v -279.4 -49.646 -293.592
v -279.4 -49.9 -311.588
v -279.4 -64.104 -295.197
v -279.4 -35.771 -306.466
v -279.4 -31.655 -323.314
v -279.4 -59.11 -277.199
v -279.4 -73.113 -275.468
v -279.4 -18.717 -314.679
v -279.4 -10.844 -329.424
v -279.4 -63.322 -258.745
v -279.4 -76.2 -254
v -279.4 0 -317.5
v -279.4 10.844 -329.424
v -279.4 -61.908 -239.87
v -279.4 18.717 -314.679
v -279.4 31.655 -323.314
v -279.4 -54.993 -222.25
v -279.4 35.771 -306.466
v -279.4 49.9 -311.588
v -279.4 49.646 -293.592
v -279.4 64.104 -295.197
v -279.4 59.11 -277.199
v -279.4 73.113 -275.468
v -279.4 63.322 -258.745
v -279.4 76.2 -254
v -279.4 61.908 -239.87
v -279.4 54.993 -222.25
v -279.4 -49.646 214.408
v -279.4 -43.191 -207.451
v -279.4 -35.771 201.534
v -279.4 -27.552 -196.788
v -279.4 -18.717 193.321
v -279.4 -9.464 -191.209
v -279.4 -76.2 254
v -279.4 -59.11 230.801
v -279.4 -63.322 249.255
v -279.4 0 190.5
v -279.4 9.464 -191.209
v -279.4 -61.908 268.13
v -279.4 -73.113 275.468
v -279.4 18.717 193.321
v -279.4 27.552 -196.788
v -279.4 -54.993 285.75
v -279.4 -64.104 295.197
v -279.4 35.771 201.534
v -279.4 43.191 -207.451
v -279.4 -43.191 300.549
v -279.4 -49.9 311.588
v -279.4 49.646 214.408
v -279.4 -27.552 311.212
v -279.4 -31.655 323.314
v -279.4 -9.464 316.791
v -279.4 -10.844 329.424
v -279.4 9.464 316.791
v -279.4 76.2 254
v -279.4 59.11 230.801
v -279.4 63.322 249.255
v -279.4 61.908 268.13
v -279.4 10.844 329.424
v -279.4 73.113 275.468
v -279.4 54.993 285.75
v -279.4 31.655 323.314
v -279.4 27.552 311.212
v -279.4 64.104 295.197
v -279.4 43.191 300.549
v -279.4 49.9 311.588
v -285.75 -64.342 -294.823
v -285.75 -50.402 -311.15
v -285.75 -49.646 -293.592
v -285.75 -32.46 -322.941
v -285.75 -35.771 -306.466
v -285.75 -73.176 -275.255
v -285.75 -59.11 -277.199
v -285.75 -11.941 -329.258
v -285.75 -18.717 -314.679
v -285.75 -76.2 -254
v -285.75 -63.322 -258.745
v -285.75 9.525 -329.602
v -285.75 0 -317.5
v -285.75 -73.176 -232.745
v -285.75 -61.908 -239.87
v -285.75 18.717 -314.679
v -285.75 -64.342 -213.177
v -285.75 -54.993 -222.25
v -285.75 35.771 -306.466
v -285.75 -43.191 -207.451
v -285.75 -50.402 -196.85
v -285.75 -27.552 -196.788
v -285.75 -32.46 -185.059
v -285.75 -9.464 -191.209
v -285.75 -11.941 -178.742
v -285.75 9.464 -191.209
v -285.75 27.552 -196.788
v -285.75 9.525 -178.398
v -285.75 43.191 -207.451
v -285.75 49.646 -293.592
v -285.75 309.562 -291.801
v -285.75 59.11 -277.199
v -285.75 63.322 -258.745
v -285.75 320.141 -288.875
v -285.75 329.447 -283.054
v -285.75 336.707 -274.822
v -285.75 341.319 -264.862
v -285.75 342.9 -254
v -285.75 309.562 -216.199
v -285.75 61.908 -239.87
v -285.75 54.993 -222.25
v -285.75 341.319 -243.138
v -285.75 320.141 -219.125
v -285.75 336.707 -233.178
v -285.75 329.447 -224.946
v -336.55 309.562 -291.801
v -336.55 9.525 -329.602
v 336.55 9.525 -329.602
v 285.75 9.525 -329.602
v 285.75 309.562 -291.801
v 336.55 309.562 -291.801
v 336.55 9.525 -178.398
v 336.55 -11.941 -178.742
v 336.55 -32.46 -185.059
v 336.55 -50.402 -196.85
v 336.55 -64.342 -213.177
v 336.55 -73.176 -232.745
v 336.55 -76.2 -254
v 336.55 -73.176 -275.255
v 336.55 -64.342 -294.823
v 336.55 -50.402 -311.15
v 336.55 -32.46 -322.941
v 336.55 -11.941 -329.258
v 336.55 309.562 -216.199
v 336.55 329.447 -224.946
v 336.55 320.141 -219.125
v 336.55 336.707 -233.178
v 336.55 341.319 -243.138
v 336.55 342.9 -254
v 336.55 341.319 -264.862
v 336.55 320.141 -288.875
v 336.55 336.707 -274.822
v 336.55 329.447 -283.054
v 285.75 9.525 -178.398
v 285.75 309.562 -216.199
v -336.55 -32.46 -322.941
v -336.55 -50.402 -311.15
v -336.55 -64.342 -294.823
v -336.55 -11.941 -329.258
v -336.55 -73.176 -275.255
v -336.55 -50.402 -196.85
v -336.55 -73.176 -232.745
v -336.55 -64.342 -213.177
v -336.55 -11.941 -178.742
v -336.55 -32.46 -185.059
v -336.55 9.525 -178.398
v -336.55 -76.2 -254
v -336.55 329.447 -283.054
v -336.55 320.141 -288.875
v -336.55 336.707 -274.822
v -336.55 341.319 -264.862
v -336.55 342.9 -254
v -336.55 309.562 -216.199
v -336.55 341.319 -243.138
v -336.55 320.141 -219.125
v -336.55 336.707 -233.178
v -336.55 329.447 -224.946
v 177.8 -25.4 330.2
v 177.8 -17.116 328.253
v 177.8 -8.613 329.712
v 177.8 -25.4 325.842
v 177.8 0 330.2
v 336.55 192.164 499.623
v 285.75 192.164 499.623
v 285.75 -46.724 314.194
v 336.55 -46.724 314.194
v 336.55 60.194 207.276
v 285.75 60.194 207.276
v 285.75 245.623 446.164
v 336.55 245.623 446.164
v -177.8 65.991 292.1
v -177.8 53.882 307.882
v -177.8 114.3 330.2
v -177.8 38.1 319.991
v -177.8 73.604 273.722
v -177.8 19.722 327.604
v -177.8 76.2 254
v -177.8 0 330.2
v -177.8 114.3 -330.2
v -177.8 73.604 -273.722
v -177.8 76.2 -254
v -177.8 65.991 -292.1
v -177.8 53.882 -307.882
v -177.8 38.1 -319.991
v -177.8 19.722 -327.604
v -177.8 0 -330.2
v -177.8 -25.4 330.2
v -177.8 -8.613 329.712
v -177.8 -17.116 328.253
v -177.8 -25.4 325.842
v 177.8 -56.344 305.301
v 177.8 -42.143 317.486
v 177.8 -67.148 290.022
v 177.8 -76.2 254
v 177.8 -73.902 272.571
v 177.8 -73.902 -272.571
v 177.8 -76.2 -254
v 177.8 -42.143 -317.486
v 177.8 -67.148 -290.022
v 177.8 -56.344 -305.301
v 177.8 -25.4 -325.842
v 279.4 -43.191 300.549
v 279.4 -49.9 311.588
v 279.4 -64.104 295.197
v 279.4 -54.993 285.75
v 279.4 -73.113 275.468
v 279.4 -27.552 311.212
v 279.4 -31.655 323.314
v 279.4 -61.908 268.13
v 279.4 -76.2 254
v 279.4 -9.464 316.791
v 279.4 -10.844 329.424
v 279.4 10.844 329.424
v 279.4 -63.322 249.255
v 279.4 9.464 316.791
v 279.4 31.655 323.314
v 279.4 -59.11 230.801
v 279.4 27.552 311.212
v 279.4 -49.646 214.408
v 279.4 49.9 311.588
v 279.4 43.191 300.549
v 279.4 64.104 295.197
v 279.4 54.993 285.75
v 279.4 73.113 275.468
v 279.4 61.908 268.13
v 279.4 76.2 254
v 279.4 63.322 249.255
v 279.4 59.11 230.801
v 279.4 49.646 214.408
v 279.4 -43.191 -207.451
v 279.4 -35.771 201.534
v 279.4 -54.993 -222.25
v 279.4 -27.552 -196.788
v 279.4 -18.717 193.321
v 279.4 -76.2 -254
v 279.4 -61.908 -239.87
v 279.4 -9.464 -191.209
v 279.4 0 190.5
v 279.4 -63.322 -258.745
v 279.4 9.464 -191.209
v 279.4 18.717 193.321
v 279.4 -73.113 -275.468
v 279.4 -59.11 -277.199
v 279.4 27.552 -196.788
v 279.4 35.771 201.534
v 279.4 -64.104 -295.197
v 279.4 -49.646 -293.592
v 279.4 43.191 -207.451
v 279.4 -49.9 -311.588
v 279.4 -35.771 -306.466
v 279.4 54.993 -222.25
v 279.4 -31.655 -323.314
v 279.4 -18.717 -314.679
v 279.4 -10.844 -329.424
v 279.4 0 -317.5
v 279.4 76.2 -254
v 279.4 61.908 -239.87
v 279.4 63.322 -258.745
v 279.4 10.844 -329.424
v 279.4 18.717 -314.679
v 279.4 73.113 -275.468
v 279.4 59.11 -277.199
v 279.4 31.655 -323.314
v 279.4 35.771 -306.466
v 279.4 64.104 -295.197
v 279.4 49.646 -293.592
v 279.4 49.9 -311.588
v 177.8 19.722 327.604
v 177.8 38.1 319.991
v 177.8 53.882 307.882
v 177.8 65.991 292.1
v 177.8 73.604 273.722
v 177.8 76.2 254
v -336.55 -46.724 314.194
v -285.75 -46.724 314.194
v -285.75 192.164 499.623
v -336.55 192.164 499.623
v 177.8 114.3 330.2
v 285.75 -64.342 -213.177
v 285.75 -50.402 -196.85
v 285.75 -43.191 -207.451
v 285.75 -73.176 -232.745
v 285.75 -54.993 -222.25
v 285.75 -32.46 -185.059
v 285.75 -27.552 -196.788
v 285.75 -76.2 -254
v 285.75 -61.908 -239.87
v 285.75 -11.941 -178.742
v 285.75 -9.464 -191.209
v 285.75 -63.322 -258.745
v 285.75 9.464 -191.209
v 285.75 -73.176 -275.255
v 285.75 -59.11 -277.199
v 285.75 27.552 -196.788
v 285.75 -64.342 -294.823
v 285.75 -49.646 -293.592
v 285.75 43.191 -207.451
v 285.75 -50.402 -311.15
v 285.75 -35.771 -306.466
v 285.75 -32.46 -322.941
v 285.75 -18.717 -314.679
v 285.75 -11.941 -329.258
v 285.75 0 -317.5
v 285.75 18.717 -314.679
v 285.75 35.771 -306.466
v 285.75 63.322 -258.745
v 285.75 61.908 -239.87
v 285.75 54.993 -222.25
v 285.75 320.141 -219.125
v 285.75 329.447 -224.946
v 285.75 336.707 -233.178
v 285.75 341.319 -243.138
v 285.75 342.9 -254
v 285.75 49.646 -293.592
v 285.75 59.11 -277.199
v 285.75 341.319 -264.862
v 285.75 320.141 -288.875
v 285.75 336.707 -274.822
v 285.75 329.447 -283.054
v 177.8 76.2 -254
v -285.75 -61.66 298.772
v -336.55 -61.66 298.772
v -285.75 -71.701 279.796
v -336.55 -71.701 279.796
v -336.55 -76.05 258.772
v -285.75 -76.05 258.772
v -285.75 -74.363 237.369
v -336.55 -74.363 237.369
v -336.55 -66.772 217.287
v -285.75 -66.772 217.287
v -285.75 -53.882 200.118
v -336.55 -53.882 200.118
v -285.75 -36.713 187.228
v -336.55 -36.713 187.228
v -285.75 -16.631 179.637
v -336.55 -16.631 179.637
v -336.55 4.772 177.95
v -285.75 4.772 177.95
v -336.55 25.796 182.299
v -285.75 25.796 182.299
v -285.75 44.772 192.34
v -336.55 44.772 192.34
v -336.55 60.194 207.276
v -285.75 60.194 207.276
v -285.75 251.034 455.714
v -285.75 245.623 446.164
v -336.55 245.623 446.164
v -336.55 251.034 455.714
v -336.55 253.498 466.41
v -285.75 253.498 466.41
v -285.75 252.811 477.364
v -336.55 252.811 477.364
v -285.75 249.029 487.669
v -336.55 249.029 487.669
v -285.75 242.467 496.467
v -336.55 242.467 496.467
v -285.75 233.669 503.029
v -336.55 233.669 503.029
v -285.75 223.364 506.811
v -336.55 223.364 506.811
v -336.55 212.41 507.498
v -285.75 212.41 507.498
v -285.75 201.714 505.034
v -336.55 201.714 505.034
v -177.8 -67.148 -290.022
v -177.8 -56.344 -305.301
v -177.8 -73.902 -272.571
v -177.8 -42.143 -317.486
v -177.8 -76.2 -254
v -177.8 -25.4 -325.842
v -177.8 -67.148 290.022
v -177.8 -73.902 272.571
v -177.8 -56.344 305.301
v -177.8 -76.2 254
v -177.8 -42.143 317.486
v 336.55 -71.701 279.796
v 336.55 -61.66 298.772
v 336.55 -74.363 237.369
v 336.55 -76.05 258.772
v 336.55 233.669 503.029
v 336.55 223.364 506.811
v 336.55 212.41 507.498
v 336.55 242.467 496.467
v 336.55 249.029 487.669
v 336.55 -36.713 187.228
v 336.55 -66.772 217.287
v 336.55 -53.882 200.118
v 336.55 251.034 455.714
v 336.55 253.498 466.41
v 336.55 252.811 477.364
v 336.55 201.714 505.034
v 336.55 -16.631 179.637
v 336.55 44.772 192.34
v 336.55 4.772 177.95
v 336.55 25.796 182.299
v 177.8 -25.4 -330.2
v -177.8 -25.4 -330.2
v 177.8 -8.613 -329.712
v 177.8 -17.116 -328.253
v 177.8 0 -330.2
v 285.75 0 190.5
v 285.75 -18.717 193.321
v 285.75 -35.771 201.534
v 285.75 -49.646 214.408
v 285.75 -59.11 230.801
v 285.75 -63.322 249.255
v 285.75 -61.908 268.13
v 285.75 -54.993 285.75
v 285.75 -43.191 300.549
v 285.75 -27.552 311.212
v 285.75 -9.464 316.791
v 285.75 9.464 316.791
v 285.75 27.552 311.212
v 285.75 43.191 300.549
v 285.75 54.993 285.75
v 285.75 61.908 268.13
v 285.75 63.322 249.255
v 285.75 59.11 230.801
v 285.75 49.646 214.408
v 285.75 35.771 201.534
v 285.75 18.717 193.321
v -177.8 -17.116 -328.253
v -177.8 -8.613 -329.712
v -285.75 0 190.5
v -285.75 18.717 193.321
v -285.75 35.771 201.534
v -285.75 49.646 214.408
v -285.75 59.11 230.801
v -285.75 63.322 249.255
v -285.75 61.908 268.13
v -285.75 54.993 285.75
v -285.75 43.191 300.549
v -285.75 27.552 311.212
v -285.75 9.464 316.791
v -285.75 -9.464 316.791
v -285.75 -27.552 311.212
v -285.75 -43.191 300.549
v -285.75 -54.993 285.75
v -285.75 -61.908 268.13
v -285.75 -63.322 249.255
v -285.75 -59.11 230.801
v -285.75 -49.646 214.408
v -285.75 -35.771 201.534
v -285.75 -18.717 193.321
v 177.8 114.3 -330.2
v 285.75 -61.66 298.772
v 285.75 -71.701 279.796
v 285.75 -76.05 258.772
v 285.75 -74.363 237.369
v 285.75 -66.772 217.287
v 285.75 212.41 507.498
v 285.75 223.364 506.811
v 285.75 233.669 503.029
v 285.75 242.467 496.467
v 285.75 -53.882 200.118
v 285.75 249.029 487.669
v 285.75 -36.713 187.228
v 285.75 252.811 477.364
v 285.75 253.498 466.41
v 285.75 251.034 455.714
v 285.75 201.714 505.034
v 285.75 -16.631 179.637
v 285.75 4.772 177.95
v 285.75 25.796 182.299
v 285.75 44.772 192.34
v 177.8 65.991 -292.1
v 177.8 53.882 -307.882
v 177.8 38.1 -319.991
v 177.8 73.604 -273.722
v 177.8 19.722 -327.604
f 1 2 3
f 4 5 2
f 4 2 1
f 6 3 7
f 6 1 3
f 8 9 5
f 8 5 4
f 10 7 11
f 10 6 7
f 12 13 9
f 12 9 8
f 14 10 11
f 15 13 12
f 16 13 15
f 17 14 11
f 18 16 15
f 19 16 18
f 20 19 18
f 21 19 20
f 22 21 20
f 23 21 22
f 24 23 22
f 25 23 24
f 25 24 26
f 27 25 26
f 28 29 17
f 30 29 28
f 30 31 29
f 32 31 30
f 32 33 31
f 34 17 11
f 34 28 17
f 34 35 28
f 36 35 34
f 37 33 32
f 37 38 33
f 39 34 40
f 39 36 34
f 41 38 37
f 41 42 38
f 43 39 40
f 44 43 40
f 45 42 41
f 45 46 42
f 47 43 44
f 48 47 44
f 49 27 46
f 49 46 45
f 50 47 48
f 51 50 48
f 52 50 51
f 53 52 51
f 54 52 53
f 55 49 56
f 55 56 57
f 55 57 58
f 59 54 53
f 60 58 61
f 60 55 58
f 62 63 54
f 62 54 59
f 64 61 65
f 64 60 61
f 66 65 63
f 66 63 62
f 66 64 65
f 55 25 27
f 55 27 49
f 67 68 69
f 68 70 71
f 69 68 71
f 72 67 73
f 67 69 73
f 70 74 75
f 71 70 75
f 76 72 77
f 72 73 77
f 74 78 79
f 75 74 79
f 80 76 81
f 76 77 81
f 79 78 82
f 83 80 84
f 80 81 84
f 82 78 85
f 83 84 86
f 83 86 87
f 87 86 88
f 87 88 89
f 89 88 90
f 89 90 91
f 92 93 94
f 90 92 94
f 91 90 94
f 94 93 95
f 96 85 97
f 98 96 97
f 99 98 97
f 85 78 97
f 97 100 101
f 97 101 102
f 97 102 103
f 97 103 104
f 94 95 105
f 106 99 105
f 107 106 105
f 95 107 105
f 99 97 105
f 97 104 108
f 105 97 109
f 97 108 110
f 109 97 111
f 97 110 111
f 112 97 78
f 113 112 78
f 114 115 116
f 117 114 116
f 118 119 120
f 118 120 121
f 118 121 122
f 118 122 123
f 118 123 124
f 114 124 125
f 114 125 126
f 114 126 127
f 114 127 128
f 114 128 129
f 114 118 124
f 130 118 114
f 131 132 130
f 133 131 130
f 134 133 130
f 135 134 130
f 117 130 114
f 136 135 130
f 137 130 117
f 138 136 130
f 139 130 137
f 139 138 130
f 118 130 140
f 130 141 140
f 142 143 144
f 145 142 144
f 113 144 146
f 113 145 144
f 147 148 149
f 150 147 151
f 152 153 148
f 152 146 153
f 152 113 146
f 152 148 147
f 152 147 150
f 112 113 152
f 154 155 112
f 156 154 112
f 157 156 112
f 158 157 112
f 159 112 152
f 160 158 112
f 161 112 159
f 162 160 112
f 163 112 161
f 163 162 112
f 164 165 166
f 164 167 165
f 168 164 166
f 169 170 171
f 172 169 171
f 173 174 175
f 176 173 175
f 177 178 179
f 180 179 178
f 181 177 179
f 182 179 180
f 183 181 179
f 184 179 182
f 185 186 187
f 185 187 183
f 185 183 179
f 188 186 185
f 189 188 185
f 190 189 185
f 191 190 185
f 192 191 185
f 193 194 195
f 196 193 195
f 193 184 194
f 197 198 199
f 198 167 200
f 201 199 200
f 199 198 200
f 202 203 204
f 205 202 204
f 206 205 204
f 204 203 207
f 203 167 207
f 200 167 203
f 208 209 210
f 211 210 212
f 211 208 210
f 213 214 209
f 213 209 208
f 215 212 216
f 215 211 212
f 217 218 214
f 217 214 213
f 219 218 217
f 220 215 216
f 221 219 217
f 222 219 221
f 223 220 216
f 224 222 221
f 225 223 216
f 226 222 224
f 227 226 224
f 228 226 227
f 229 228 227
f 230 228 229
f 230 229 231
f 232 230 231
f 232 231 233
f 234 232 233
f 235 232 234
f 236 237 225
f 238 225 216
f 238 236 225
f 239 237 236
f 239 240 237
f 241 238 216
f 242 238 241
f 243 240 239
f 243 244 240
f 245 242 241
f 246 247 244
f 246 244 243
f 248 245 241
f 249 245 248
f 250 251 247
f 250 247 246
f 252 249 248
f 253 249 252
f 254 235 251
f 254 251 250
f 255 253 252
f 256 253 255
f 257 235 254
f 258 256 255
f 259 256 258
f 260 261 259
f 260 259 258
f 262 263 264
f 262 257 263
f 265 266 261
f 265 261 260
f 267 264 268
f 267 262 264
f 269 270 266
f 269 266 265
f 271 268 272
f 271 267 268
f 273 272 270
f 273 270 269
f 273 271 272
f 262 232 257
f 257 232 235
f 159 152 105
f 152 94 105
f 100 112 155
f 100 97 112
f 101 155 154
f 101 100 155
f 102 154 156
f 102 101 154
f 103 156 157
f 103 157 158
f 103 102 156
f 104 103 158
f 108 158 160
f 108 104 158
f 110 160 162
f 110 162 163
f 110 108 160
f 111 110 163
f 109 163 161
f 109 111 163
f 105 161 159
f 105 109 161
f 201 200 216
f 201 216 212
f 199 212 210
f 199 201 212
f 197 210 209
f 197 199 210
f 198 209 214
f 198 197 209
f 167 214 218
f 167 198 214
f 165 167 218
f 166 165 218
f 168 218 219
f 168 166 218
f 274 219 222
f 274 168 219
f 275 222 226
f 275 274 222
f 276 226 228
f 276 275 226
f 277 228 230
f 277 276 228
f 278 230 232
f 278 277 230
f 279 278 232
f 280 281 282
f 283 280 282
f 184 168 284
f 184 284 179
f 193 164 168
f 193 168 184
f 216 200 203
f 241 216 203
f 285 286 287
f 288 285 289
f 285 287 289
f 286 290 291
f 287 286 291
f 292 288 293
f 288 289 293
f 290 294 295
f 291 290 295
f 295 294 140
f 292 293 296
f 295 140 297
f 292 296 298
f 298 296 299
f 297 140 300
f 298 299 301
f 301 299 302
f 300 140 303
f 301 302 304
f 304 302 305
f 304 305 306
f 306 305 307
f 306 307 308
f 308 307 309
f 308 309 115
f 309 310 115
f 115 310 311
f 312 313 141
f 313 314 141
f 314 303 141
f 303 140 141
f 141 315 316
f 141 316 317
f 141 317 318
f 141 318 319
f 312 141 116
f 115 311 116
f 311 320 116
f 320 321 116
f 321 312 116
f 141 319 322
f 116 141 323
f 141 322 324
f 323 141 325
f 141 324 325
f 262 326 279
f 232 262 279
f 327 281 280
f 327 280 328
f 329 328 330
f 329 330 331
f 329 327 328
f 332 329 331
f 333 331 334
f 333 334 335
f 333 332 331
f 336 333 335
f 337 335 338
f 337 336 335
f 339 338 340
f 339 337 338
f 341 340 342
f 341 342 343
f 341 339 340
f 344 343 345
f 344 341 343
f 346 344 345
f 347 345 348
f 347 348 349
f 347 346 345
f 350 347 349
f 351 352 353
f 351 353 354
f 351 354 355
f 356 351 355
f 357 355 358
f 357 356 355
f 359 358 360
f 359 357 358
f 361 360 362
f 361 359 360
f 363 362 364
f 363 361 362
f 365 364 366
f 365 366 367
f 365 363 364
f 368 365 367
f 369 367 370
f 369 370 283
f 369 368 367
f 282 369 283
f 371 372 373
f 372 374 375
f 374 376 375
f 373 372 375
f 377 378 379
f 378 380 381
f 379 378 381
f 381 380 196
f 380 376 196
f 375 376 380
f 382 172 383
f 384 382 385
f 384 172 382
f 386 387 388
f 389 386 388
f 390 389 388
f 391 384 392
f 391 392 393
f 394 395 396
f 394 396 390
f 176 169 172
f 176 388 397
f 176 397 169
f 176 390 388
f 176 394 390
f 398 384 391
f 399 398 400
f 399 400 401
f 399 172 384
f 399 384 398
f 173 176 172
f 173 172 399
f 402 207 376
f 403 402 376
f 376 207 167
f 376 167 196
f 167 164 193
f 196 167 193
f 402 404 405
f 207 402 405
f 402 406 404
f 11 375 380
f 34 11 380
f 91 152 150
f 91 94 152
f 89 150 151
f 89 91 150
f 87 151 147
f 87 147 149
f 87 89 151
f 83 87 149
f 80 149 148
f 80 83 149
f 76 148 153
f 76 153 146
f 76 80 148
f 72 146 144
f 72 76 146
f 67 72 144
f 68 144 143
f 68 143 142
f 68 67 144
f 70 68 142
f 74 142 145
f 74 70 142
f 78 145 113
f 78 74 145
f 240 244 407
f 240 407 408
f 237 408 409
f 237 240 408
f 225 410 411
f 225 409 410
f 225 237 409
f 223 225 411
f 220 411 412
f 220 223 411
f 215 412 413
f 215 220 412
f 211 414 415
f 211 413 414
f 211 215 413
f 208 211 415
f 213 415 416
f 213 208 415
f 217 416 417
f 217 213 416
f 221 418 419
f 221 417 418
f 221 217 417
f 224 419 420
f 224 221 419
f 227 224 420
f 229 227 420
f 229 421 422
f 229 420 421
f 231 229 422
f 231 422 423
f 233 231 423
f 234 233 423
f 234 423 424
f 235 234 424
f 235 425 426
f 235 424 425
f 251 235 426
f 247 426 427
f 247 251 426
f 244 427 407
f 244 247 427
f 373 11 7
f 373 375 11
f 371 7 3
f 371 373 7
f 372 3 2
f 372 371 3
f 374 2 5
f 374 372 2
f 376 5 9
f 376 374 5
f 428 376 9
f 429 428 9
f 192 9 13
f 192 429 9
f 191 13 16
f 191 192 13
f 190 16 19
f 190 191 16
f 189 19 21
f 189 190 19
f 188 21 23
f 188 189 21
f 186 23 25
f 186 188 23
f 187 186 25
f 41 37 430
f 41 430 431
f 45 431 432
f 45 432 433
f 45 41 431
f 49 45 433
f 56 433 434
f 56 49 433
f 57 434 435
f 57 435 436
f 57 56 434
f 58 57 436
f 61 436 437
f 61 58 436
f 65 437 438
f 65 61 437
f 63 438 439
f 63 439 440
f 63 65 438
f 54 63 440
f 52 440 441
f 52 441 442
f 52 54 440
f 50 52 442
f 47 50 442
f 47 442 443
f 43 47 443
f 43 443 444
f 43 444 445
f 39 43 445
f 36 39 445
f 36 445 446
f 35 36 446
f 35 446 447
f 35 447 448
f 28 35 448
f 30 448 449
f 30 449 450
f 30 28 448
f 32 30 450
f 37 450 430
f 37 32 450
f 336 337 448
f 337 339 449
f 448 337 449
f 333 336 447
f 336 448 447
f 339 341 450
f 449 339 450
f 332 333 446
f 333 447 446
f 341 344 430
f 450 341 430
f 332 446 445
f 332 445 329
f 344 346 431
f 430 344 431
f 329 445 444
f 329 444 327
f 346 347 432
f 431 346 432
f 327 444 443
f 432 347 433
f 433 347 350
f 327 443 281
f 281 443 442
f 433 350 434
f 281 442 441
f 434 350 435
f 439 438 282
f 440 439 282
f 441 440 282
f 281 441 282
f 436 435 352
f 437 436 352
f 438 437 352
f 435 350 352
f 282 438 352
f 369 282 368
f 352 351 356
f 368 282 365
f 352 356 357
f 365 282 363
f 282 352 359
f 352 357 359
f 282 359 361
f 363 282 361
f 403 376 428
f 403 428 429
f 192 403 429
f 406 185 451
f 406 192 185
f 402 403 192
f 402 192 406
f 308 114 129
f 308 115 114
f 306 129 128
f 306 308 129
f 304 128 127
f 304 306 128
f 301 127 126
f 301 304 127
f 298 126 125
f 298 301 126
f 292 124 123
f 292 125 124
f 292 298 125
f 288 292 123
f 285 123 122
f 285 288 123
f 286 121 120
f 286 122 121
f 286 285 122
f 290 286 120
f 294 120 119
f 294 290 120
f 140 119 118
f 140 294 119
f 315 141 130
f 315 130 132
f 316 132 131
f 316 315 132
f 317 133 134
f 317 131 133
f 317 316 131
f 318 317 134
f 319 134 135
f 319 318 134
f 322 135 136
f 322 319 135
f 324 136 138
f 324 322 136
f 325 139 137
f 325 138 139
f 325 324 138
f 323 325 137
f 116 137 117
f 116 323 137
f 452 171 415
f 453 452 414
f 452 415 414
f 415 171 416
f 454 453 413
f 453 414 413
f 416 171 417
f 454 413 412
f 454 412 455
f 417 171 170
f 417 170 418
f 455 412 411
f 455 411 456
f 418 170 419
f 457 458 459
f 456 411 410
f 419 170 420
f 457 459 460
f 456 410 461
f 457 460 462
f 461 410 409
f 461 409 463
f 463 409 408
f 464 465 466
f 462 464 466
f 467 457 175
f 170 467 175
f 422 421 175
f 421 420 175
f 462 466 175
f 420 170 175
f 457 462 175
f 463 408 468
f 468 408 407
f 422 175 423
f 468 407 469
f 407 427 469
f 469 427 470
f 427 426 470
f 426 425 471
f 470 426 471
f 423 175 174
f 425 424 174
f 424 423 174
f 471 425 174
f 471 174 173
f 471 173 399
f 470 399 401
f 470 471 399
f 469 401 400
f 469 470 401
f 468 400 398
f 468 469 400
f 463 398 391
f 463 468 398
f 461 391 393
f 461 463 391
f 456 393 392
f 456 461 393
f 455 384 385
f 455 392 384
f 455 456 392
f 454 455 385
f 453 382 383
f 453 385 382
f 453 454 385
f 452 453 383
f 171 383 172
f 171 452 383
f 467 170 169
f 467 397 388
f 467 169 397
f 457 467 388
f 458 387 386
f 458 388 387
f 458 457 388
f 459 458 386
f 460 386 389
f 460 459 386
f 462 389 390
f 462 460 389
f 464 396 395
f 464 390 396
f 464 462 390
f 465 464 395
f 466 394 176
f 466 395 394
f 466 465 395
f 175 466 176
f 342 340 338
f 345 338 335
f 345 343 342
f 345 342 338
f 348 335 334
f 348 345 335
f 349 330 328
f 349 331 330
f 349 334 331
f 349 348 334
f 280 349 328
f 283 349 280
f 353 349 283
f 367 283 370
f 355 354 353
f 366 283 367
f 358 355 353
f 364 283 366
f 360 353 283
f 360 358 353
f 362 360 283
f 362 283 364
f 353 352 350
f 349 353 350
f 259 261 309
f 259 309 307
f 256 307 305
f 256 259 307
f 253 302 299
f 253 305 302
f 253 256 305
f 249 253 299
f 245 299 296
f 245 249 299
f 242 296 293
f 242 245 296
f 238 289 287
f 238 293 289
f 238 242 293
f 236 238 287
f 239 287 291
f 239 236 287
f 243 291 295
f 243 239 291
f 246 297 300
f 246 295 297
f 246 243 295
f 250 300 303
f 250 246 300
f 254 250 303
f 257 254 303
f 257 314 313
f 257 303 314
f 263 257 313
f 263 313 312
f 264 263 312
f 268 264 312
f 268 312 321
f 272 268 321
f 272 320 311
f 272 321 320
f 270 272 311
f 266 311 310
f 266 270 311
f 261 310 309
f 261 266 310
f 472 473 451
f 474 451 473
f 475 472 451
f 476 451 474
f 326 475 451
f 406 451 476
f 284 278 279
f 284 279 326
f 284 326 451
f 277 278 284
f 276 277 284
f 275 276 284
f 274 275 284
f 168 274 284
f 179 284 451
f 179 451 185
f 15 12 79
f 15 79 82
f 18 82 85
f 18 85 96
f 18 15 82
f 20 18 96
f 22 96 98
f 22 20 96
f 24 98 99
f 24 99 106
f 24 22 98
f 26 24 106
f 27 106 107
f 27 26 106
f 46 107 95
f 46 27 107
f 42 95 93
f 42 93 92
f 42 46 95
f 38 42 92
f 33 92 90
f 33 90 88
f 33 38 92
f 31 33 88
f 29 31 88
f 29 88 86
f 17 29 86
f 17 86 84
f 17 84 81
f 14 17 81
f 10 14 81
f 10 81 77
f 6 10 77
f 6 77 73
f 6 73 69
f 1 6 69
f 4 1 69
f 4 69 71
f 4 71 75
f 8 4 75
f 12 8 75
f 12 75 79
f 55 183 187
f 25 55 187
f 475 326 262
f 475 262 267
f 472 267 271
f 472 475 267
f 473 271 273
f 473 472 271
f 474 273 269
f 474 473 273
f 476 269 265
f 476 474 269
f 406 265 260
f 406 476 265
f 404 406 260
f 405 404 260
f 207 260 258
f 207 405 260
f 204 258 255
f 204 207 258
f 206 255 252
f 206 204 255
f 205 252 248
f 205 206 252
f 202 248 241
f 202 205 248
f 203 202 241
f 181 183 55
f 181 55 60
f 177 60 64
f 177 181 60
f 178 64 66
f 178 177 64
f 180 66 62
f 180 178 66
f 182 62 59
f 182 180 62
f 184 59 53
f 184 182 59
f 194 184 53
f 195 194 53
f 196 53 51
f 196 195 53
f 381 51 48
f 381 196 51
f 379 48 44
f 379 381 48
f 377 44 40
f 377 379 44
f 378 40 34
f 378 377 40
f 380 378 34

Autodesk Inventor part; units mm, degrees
ref_plane "YZ Plane" through (0, 0, 0) normal (1, 0, 0) x (0, 1, 0)
ref_plane "XZ Plane" through (0, 0, 0) normal (0, 1, 0) x (-1, 0, 0)
ref_plane "XY Plane" through (0, 0, 0) normal (0, 0, 1) x (1, 0, 0)
sketch "Sketch1" plane through (0, 0, 0) normal (0, 1, 0) x (-1, 0, 0)
  line L0 (-177.8, 330.2) -> (177.8, 330.2)
  line L1 (177.8, 330.2) -> (177.8, -330.2)
  line L2 (177.8, -330.2) -> (-177.8, -330.2)
  line L3 (-177.8, -330.2) -> (-177.8, 330.2)
  line L4 (-177.8, 330.2) -> (177.8, -330.2) construction
  line L5 (177.8, 330.2) -> (-177.8, -330.2) construction
  point P0 (0, 0)
  dimension "d0" = 355.6
  dimension "d1" = 660.4
extrude "Extrusion1" add sketch "Sketch1" along normal blind 114.3 and the other way blind 25.4
sketch "Sketch2" plane through (177.8, -25.4, -330.2) normal (1, 0, 0) x (0, 0, -1)
  line L0 (-584.2, 25.4) -> (-76.2, 25.4) construction
  line L1 (-584.2, -50.8) -> (-76.2, -50.8)
  line L2 (-76.2, 101.6) -> (-584.2, 101.6)
  arc A0 (-584.2, 101.6) -> (-584.2, -50.8) centre (-584.2, 25.4) ccw
  arc A1 (-76.2, -50.8) -> (-76.2, 101.6) centre (-76.2, 25.4) ccw
  line L3 (-330.2, 25.4) -> (177.8, 25.4) construction
  line L4 (-330.2, 25.4) -> (-330.2, 0) construction
  line L5 (-660.4, 0) -> (0, 0) construction
  point P0 (-330.2, 25.4)
  dimension "d6" = 254
  dimension "d7" = 0
  dimension "d8" = 152.4
  dimension "d9" = 25.4
extrude "Extrusion2" add sketch "Sketch2" along normal blind 101.6
sketch "Sketch3" plane through (279.4, -25.4, -330.2) normal (1, 0, 0) x (0, 0, -1)
  circle A0 centre (-584.2, 25.4) radius 63.5
  circle A1 centre (-76.2, 25.4) radius 63.5
  arc A2 (-584.2, 101.6) -> (-584.2, -50.8) centre (-584.2, 25.4) ccw construction
  arc A3 (-76.2, -50.8) -> (-76.2, 101.6) centre (-76.2, 25.4) ccw construction
  point P0 (-330.2, 25.4)
  dimension "d12" = 127
extrude "Extrusion3" add sketch "Sketch3" along normal blind 6.35
sketch "Sketch4" plane through (285.75, 0, 254) normal (1, 0, 0) x (0, 0, -1)
  line L0 (0, 0) -> (-215.5261, 215.5261) construction
  line L1 (46.7237, 60.1941) -> (-192.1643, 245.6232)
  line L2 (-245.6232, 192.1643) -> (-60.1941, -46.7237)
  arc A0 (-60.1941, -46.7237) -> (46.7237, 60.1941) centre (0, 0) ccw
  arc A1 (-192.1643, 245.6232) -> (-245.6232, 192.1643) centre (-215.5261, 215.5261) ccw
  arc A2 (0, 76.2) -> (0, -76.2) centre (0, 0) ccw construction
  line L3 (0, 0) -> (-144.2559, 0) construction
  line L4 (508, 0) -> (508, 304.8) construction
  line L5 (583.6023, 9.525) -> (545.8012, 309.5625)
  line L6 (470.1988, 309.5625) -> (432.3977, 9.525)
  arc A3 (432.3977, 9.525) -> (583.6023, 9.525) centre (508, 0) ccw
  arc A4 (545.8012, 309.5625) -> (470.1988, 309.5625) centre (508, 304.8) ccw
  circle A5 centre (508, 0) radius 63.5 construction
  point P0 (254, 0)
  point P1 (-107.7631, 107.7631)
  point P2 (508, 152.4)
  dimension "d15" = 304.8
  dimension "d17" = 38.1
  dimension "d20" = 45
extrude "Extrusion4" add sketch "Sketch4" along normal blind 50.8
mirror "Mirror1" about plane through (0, 0, 0) normal (1, 0, 0) of "Extrusion2", "Extrusion4", "Extrusion3"
properties part number "Dimensions(Roughly)" material "Air"
